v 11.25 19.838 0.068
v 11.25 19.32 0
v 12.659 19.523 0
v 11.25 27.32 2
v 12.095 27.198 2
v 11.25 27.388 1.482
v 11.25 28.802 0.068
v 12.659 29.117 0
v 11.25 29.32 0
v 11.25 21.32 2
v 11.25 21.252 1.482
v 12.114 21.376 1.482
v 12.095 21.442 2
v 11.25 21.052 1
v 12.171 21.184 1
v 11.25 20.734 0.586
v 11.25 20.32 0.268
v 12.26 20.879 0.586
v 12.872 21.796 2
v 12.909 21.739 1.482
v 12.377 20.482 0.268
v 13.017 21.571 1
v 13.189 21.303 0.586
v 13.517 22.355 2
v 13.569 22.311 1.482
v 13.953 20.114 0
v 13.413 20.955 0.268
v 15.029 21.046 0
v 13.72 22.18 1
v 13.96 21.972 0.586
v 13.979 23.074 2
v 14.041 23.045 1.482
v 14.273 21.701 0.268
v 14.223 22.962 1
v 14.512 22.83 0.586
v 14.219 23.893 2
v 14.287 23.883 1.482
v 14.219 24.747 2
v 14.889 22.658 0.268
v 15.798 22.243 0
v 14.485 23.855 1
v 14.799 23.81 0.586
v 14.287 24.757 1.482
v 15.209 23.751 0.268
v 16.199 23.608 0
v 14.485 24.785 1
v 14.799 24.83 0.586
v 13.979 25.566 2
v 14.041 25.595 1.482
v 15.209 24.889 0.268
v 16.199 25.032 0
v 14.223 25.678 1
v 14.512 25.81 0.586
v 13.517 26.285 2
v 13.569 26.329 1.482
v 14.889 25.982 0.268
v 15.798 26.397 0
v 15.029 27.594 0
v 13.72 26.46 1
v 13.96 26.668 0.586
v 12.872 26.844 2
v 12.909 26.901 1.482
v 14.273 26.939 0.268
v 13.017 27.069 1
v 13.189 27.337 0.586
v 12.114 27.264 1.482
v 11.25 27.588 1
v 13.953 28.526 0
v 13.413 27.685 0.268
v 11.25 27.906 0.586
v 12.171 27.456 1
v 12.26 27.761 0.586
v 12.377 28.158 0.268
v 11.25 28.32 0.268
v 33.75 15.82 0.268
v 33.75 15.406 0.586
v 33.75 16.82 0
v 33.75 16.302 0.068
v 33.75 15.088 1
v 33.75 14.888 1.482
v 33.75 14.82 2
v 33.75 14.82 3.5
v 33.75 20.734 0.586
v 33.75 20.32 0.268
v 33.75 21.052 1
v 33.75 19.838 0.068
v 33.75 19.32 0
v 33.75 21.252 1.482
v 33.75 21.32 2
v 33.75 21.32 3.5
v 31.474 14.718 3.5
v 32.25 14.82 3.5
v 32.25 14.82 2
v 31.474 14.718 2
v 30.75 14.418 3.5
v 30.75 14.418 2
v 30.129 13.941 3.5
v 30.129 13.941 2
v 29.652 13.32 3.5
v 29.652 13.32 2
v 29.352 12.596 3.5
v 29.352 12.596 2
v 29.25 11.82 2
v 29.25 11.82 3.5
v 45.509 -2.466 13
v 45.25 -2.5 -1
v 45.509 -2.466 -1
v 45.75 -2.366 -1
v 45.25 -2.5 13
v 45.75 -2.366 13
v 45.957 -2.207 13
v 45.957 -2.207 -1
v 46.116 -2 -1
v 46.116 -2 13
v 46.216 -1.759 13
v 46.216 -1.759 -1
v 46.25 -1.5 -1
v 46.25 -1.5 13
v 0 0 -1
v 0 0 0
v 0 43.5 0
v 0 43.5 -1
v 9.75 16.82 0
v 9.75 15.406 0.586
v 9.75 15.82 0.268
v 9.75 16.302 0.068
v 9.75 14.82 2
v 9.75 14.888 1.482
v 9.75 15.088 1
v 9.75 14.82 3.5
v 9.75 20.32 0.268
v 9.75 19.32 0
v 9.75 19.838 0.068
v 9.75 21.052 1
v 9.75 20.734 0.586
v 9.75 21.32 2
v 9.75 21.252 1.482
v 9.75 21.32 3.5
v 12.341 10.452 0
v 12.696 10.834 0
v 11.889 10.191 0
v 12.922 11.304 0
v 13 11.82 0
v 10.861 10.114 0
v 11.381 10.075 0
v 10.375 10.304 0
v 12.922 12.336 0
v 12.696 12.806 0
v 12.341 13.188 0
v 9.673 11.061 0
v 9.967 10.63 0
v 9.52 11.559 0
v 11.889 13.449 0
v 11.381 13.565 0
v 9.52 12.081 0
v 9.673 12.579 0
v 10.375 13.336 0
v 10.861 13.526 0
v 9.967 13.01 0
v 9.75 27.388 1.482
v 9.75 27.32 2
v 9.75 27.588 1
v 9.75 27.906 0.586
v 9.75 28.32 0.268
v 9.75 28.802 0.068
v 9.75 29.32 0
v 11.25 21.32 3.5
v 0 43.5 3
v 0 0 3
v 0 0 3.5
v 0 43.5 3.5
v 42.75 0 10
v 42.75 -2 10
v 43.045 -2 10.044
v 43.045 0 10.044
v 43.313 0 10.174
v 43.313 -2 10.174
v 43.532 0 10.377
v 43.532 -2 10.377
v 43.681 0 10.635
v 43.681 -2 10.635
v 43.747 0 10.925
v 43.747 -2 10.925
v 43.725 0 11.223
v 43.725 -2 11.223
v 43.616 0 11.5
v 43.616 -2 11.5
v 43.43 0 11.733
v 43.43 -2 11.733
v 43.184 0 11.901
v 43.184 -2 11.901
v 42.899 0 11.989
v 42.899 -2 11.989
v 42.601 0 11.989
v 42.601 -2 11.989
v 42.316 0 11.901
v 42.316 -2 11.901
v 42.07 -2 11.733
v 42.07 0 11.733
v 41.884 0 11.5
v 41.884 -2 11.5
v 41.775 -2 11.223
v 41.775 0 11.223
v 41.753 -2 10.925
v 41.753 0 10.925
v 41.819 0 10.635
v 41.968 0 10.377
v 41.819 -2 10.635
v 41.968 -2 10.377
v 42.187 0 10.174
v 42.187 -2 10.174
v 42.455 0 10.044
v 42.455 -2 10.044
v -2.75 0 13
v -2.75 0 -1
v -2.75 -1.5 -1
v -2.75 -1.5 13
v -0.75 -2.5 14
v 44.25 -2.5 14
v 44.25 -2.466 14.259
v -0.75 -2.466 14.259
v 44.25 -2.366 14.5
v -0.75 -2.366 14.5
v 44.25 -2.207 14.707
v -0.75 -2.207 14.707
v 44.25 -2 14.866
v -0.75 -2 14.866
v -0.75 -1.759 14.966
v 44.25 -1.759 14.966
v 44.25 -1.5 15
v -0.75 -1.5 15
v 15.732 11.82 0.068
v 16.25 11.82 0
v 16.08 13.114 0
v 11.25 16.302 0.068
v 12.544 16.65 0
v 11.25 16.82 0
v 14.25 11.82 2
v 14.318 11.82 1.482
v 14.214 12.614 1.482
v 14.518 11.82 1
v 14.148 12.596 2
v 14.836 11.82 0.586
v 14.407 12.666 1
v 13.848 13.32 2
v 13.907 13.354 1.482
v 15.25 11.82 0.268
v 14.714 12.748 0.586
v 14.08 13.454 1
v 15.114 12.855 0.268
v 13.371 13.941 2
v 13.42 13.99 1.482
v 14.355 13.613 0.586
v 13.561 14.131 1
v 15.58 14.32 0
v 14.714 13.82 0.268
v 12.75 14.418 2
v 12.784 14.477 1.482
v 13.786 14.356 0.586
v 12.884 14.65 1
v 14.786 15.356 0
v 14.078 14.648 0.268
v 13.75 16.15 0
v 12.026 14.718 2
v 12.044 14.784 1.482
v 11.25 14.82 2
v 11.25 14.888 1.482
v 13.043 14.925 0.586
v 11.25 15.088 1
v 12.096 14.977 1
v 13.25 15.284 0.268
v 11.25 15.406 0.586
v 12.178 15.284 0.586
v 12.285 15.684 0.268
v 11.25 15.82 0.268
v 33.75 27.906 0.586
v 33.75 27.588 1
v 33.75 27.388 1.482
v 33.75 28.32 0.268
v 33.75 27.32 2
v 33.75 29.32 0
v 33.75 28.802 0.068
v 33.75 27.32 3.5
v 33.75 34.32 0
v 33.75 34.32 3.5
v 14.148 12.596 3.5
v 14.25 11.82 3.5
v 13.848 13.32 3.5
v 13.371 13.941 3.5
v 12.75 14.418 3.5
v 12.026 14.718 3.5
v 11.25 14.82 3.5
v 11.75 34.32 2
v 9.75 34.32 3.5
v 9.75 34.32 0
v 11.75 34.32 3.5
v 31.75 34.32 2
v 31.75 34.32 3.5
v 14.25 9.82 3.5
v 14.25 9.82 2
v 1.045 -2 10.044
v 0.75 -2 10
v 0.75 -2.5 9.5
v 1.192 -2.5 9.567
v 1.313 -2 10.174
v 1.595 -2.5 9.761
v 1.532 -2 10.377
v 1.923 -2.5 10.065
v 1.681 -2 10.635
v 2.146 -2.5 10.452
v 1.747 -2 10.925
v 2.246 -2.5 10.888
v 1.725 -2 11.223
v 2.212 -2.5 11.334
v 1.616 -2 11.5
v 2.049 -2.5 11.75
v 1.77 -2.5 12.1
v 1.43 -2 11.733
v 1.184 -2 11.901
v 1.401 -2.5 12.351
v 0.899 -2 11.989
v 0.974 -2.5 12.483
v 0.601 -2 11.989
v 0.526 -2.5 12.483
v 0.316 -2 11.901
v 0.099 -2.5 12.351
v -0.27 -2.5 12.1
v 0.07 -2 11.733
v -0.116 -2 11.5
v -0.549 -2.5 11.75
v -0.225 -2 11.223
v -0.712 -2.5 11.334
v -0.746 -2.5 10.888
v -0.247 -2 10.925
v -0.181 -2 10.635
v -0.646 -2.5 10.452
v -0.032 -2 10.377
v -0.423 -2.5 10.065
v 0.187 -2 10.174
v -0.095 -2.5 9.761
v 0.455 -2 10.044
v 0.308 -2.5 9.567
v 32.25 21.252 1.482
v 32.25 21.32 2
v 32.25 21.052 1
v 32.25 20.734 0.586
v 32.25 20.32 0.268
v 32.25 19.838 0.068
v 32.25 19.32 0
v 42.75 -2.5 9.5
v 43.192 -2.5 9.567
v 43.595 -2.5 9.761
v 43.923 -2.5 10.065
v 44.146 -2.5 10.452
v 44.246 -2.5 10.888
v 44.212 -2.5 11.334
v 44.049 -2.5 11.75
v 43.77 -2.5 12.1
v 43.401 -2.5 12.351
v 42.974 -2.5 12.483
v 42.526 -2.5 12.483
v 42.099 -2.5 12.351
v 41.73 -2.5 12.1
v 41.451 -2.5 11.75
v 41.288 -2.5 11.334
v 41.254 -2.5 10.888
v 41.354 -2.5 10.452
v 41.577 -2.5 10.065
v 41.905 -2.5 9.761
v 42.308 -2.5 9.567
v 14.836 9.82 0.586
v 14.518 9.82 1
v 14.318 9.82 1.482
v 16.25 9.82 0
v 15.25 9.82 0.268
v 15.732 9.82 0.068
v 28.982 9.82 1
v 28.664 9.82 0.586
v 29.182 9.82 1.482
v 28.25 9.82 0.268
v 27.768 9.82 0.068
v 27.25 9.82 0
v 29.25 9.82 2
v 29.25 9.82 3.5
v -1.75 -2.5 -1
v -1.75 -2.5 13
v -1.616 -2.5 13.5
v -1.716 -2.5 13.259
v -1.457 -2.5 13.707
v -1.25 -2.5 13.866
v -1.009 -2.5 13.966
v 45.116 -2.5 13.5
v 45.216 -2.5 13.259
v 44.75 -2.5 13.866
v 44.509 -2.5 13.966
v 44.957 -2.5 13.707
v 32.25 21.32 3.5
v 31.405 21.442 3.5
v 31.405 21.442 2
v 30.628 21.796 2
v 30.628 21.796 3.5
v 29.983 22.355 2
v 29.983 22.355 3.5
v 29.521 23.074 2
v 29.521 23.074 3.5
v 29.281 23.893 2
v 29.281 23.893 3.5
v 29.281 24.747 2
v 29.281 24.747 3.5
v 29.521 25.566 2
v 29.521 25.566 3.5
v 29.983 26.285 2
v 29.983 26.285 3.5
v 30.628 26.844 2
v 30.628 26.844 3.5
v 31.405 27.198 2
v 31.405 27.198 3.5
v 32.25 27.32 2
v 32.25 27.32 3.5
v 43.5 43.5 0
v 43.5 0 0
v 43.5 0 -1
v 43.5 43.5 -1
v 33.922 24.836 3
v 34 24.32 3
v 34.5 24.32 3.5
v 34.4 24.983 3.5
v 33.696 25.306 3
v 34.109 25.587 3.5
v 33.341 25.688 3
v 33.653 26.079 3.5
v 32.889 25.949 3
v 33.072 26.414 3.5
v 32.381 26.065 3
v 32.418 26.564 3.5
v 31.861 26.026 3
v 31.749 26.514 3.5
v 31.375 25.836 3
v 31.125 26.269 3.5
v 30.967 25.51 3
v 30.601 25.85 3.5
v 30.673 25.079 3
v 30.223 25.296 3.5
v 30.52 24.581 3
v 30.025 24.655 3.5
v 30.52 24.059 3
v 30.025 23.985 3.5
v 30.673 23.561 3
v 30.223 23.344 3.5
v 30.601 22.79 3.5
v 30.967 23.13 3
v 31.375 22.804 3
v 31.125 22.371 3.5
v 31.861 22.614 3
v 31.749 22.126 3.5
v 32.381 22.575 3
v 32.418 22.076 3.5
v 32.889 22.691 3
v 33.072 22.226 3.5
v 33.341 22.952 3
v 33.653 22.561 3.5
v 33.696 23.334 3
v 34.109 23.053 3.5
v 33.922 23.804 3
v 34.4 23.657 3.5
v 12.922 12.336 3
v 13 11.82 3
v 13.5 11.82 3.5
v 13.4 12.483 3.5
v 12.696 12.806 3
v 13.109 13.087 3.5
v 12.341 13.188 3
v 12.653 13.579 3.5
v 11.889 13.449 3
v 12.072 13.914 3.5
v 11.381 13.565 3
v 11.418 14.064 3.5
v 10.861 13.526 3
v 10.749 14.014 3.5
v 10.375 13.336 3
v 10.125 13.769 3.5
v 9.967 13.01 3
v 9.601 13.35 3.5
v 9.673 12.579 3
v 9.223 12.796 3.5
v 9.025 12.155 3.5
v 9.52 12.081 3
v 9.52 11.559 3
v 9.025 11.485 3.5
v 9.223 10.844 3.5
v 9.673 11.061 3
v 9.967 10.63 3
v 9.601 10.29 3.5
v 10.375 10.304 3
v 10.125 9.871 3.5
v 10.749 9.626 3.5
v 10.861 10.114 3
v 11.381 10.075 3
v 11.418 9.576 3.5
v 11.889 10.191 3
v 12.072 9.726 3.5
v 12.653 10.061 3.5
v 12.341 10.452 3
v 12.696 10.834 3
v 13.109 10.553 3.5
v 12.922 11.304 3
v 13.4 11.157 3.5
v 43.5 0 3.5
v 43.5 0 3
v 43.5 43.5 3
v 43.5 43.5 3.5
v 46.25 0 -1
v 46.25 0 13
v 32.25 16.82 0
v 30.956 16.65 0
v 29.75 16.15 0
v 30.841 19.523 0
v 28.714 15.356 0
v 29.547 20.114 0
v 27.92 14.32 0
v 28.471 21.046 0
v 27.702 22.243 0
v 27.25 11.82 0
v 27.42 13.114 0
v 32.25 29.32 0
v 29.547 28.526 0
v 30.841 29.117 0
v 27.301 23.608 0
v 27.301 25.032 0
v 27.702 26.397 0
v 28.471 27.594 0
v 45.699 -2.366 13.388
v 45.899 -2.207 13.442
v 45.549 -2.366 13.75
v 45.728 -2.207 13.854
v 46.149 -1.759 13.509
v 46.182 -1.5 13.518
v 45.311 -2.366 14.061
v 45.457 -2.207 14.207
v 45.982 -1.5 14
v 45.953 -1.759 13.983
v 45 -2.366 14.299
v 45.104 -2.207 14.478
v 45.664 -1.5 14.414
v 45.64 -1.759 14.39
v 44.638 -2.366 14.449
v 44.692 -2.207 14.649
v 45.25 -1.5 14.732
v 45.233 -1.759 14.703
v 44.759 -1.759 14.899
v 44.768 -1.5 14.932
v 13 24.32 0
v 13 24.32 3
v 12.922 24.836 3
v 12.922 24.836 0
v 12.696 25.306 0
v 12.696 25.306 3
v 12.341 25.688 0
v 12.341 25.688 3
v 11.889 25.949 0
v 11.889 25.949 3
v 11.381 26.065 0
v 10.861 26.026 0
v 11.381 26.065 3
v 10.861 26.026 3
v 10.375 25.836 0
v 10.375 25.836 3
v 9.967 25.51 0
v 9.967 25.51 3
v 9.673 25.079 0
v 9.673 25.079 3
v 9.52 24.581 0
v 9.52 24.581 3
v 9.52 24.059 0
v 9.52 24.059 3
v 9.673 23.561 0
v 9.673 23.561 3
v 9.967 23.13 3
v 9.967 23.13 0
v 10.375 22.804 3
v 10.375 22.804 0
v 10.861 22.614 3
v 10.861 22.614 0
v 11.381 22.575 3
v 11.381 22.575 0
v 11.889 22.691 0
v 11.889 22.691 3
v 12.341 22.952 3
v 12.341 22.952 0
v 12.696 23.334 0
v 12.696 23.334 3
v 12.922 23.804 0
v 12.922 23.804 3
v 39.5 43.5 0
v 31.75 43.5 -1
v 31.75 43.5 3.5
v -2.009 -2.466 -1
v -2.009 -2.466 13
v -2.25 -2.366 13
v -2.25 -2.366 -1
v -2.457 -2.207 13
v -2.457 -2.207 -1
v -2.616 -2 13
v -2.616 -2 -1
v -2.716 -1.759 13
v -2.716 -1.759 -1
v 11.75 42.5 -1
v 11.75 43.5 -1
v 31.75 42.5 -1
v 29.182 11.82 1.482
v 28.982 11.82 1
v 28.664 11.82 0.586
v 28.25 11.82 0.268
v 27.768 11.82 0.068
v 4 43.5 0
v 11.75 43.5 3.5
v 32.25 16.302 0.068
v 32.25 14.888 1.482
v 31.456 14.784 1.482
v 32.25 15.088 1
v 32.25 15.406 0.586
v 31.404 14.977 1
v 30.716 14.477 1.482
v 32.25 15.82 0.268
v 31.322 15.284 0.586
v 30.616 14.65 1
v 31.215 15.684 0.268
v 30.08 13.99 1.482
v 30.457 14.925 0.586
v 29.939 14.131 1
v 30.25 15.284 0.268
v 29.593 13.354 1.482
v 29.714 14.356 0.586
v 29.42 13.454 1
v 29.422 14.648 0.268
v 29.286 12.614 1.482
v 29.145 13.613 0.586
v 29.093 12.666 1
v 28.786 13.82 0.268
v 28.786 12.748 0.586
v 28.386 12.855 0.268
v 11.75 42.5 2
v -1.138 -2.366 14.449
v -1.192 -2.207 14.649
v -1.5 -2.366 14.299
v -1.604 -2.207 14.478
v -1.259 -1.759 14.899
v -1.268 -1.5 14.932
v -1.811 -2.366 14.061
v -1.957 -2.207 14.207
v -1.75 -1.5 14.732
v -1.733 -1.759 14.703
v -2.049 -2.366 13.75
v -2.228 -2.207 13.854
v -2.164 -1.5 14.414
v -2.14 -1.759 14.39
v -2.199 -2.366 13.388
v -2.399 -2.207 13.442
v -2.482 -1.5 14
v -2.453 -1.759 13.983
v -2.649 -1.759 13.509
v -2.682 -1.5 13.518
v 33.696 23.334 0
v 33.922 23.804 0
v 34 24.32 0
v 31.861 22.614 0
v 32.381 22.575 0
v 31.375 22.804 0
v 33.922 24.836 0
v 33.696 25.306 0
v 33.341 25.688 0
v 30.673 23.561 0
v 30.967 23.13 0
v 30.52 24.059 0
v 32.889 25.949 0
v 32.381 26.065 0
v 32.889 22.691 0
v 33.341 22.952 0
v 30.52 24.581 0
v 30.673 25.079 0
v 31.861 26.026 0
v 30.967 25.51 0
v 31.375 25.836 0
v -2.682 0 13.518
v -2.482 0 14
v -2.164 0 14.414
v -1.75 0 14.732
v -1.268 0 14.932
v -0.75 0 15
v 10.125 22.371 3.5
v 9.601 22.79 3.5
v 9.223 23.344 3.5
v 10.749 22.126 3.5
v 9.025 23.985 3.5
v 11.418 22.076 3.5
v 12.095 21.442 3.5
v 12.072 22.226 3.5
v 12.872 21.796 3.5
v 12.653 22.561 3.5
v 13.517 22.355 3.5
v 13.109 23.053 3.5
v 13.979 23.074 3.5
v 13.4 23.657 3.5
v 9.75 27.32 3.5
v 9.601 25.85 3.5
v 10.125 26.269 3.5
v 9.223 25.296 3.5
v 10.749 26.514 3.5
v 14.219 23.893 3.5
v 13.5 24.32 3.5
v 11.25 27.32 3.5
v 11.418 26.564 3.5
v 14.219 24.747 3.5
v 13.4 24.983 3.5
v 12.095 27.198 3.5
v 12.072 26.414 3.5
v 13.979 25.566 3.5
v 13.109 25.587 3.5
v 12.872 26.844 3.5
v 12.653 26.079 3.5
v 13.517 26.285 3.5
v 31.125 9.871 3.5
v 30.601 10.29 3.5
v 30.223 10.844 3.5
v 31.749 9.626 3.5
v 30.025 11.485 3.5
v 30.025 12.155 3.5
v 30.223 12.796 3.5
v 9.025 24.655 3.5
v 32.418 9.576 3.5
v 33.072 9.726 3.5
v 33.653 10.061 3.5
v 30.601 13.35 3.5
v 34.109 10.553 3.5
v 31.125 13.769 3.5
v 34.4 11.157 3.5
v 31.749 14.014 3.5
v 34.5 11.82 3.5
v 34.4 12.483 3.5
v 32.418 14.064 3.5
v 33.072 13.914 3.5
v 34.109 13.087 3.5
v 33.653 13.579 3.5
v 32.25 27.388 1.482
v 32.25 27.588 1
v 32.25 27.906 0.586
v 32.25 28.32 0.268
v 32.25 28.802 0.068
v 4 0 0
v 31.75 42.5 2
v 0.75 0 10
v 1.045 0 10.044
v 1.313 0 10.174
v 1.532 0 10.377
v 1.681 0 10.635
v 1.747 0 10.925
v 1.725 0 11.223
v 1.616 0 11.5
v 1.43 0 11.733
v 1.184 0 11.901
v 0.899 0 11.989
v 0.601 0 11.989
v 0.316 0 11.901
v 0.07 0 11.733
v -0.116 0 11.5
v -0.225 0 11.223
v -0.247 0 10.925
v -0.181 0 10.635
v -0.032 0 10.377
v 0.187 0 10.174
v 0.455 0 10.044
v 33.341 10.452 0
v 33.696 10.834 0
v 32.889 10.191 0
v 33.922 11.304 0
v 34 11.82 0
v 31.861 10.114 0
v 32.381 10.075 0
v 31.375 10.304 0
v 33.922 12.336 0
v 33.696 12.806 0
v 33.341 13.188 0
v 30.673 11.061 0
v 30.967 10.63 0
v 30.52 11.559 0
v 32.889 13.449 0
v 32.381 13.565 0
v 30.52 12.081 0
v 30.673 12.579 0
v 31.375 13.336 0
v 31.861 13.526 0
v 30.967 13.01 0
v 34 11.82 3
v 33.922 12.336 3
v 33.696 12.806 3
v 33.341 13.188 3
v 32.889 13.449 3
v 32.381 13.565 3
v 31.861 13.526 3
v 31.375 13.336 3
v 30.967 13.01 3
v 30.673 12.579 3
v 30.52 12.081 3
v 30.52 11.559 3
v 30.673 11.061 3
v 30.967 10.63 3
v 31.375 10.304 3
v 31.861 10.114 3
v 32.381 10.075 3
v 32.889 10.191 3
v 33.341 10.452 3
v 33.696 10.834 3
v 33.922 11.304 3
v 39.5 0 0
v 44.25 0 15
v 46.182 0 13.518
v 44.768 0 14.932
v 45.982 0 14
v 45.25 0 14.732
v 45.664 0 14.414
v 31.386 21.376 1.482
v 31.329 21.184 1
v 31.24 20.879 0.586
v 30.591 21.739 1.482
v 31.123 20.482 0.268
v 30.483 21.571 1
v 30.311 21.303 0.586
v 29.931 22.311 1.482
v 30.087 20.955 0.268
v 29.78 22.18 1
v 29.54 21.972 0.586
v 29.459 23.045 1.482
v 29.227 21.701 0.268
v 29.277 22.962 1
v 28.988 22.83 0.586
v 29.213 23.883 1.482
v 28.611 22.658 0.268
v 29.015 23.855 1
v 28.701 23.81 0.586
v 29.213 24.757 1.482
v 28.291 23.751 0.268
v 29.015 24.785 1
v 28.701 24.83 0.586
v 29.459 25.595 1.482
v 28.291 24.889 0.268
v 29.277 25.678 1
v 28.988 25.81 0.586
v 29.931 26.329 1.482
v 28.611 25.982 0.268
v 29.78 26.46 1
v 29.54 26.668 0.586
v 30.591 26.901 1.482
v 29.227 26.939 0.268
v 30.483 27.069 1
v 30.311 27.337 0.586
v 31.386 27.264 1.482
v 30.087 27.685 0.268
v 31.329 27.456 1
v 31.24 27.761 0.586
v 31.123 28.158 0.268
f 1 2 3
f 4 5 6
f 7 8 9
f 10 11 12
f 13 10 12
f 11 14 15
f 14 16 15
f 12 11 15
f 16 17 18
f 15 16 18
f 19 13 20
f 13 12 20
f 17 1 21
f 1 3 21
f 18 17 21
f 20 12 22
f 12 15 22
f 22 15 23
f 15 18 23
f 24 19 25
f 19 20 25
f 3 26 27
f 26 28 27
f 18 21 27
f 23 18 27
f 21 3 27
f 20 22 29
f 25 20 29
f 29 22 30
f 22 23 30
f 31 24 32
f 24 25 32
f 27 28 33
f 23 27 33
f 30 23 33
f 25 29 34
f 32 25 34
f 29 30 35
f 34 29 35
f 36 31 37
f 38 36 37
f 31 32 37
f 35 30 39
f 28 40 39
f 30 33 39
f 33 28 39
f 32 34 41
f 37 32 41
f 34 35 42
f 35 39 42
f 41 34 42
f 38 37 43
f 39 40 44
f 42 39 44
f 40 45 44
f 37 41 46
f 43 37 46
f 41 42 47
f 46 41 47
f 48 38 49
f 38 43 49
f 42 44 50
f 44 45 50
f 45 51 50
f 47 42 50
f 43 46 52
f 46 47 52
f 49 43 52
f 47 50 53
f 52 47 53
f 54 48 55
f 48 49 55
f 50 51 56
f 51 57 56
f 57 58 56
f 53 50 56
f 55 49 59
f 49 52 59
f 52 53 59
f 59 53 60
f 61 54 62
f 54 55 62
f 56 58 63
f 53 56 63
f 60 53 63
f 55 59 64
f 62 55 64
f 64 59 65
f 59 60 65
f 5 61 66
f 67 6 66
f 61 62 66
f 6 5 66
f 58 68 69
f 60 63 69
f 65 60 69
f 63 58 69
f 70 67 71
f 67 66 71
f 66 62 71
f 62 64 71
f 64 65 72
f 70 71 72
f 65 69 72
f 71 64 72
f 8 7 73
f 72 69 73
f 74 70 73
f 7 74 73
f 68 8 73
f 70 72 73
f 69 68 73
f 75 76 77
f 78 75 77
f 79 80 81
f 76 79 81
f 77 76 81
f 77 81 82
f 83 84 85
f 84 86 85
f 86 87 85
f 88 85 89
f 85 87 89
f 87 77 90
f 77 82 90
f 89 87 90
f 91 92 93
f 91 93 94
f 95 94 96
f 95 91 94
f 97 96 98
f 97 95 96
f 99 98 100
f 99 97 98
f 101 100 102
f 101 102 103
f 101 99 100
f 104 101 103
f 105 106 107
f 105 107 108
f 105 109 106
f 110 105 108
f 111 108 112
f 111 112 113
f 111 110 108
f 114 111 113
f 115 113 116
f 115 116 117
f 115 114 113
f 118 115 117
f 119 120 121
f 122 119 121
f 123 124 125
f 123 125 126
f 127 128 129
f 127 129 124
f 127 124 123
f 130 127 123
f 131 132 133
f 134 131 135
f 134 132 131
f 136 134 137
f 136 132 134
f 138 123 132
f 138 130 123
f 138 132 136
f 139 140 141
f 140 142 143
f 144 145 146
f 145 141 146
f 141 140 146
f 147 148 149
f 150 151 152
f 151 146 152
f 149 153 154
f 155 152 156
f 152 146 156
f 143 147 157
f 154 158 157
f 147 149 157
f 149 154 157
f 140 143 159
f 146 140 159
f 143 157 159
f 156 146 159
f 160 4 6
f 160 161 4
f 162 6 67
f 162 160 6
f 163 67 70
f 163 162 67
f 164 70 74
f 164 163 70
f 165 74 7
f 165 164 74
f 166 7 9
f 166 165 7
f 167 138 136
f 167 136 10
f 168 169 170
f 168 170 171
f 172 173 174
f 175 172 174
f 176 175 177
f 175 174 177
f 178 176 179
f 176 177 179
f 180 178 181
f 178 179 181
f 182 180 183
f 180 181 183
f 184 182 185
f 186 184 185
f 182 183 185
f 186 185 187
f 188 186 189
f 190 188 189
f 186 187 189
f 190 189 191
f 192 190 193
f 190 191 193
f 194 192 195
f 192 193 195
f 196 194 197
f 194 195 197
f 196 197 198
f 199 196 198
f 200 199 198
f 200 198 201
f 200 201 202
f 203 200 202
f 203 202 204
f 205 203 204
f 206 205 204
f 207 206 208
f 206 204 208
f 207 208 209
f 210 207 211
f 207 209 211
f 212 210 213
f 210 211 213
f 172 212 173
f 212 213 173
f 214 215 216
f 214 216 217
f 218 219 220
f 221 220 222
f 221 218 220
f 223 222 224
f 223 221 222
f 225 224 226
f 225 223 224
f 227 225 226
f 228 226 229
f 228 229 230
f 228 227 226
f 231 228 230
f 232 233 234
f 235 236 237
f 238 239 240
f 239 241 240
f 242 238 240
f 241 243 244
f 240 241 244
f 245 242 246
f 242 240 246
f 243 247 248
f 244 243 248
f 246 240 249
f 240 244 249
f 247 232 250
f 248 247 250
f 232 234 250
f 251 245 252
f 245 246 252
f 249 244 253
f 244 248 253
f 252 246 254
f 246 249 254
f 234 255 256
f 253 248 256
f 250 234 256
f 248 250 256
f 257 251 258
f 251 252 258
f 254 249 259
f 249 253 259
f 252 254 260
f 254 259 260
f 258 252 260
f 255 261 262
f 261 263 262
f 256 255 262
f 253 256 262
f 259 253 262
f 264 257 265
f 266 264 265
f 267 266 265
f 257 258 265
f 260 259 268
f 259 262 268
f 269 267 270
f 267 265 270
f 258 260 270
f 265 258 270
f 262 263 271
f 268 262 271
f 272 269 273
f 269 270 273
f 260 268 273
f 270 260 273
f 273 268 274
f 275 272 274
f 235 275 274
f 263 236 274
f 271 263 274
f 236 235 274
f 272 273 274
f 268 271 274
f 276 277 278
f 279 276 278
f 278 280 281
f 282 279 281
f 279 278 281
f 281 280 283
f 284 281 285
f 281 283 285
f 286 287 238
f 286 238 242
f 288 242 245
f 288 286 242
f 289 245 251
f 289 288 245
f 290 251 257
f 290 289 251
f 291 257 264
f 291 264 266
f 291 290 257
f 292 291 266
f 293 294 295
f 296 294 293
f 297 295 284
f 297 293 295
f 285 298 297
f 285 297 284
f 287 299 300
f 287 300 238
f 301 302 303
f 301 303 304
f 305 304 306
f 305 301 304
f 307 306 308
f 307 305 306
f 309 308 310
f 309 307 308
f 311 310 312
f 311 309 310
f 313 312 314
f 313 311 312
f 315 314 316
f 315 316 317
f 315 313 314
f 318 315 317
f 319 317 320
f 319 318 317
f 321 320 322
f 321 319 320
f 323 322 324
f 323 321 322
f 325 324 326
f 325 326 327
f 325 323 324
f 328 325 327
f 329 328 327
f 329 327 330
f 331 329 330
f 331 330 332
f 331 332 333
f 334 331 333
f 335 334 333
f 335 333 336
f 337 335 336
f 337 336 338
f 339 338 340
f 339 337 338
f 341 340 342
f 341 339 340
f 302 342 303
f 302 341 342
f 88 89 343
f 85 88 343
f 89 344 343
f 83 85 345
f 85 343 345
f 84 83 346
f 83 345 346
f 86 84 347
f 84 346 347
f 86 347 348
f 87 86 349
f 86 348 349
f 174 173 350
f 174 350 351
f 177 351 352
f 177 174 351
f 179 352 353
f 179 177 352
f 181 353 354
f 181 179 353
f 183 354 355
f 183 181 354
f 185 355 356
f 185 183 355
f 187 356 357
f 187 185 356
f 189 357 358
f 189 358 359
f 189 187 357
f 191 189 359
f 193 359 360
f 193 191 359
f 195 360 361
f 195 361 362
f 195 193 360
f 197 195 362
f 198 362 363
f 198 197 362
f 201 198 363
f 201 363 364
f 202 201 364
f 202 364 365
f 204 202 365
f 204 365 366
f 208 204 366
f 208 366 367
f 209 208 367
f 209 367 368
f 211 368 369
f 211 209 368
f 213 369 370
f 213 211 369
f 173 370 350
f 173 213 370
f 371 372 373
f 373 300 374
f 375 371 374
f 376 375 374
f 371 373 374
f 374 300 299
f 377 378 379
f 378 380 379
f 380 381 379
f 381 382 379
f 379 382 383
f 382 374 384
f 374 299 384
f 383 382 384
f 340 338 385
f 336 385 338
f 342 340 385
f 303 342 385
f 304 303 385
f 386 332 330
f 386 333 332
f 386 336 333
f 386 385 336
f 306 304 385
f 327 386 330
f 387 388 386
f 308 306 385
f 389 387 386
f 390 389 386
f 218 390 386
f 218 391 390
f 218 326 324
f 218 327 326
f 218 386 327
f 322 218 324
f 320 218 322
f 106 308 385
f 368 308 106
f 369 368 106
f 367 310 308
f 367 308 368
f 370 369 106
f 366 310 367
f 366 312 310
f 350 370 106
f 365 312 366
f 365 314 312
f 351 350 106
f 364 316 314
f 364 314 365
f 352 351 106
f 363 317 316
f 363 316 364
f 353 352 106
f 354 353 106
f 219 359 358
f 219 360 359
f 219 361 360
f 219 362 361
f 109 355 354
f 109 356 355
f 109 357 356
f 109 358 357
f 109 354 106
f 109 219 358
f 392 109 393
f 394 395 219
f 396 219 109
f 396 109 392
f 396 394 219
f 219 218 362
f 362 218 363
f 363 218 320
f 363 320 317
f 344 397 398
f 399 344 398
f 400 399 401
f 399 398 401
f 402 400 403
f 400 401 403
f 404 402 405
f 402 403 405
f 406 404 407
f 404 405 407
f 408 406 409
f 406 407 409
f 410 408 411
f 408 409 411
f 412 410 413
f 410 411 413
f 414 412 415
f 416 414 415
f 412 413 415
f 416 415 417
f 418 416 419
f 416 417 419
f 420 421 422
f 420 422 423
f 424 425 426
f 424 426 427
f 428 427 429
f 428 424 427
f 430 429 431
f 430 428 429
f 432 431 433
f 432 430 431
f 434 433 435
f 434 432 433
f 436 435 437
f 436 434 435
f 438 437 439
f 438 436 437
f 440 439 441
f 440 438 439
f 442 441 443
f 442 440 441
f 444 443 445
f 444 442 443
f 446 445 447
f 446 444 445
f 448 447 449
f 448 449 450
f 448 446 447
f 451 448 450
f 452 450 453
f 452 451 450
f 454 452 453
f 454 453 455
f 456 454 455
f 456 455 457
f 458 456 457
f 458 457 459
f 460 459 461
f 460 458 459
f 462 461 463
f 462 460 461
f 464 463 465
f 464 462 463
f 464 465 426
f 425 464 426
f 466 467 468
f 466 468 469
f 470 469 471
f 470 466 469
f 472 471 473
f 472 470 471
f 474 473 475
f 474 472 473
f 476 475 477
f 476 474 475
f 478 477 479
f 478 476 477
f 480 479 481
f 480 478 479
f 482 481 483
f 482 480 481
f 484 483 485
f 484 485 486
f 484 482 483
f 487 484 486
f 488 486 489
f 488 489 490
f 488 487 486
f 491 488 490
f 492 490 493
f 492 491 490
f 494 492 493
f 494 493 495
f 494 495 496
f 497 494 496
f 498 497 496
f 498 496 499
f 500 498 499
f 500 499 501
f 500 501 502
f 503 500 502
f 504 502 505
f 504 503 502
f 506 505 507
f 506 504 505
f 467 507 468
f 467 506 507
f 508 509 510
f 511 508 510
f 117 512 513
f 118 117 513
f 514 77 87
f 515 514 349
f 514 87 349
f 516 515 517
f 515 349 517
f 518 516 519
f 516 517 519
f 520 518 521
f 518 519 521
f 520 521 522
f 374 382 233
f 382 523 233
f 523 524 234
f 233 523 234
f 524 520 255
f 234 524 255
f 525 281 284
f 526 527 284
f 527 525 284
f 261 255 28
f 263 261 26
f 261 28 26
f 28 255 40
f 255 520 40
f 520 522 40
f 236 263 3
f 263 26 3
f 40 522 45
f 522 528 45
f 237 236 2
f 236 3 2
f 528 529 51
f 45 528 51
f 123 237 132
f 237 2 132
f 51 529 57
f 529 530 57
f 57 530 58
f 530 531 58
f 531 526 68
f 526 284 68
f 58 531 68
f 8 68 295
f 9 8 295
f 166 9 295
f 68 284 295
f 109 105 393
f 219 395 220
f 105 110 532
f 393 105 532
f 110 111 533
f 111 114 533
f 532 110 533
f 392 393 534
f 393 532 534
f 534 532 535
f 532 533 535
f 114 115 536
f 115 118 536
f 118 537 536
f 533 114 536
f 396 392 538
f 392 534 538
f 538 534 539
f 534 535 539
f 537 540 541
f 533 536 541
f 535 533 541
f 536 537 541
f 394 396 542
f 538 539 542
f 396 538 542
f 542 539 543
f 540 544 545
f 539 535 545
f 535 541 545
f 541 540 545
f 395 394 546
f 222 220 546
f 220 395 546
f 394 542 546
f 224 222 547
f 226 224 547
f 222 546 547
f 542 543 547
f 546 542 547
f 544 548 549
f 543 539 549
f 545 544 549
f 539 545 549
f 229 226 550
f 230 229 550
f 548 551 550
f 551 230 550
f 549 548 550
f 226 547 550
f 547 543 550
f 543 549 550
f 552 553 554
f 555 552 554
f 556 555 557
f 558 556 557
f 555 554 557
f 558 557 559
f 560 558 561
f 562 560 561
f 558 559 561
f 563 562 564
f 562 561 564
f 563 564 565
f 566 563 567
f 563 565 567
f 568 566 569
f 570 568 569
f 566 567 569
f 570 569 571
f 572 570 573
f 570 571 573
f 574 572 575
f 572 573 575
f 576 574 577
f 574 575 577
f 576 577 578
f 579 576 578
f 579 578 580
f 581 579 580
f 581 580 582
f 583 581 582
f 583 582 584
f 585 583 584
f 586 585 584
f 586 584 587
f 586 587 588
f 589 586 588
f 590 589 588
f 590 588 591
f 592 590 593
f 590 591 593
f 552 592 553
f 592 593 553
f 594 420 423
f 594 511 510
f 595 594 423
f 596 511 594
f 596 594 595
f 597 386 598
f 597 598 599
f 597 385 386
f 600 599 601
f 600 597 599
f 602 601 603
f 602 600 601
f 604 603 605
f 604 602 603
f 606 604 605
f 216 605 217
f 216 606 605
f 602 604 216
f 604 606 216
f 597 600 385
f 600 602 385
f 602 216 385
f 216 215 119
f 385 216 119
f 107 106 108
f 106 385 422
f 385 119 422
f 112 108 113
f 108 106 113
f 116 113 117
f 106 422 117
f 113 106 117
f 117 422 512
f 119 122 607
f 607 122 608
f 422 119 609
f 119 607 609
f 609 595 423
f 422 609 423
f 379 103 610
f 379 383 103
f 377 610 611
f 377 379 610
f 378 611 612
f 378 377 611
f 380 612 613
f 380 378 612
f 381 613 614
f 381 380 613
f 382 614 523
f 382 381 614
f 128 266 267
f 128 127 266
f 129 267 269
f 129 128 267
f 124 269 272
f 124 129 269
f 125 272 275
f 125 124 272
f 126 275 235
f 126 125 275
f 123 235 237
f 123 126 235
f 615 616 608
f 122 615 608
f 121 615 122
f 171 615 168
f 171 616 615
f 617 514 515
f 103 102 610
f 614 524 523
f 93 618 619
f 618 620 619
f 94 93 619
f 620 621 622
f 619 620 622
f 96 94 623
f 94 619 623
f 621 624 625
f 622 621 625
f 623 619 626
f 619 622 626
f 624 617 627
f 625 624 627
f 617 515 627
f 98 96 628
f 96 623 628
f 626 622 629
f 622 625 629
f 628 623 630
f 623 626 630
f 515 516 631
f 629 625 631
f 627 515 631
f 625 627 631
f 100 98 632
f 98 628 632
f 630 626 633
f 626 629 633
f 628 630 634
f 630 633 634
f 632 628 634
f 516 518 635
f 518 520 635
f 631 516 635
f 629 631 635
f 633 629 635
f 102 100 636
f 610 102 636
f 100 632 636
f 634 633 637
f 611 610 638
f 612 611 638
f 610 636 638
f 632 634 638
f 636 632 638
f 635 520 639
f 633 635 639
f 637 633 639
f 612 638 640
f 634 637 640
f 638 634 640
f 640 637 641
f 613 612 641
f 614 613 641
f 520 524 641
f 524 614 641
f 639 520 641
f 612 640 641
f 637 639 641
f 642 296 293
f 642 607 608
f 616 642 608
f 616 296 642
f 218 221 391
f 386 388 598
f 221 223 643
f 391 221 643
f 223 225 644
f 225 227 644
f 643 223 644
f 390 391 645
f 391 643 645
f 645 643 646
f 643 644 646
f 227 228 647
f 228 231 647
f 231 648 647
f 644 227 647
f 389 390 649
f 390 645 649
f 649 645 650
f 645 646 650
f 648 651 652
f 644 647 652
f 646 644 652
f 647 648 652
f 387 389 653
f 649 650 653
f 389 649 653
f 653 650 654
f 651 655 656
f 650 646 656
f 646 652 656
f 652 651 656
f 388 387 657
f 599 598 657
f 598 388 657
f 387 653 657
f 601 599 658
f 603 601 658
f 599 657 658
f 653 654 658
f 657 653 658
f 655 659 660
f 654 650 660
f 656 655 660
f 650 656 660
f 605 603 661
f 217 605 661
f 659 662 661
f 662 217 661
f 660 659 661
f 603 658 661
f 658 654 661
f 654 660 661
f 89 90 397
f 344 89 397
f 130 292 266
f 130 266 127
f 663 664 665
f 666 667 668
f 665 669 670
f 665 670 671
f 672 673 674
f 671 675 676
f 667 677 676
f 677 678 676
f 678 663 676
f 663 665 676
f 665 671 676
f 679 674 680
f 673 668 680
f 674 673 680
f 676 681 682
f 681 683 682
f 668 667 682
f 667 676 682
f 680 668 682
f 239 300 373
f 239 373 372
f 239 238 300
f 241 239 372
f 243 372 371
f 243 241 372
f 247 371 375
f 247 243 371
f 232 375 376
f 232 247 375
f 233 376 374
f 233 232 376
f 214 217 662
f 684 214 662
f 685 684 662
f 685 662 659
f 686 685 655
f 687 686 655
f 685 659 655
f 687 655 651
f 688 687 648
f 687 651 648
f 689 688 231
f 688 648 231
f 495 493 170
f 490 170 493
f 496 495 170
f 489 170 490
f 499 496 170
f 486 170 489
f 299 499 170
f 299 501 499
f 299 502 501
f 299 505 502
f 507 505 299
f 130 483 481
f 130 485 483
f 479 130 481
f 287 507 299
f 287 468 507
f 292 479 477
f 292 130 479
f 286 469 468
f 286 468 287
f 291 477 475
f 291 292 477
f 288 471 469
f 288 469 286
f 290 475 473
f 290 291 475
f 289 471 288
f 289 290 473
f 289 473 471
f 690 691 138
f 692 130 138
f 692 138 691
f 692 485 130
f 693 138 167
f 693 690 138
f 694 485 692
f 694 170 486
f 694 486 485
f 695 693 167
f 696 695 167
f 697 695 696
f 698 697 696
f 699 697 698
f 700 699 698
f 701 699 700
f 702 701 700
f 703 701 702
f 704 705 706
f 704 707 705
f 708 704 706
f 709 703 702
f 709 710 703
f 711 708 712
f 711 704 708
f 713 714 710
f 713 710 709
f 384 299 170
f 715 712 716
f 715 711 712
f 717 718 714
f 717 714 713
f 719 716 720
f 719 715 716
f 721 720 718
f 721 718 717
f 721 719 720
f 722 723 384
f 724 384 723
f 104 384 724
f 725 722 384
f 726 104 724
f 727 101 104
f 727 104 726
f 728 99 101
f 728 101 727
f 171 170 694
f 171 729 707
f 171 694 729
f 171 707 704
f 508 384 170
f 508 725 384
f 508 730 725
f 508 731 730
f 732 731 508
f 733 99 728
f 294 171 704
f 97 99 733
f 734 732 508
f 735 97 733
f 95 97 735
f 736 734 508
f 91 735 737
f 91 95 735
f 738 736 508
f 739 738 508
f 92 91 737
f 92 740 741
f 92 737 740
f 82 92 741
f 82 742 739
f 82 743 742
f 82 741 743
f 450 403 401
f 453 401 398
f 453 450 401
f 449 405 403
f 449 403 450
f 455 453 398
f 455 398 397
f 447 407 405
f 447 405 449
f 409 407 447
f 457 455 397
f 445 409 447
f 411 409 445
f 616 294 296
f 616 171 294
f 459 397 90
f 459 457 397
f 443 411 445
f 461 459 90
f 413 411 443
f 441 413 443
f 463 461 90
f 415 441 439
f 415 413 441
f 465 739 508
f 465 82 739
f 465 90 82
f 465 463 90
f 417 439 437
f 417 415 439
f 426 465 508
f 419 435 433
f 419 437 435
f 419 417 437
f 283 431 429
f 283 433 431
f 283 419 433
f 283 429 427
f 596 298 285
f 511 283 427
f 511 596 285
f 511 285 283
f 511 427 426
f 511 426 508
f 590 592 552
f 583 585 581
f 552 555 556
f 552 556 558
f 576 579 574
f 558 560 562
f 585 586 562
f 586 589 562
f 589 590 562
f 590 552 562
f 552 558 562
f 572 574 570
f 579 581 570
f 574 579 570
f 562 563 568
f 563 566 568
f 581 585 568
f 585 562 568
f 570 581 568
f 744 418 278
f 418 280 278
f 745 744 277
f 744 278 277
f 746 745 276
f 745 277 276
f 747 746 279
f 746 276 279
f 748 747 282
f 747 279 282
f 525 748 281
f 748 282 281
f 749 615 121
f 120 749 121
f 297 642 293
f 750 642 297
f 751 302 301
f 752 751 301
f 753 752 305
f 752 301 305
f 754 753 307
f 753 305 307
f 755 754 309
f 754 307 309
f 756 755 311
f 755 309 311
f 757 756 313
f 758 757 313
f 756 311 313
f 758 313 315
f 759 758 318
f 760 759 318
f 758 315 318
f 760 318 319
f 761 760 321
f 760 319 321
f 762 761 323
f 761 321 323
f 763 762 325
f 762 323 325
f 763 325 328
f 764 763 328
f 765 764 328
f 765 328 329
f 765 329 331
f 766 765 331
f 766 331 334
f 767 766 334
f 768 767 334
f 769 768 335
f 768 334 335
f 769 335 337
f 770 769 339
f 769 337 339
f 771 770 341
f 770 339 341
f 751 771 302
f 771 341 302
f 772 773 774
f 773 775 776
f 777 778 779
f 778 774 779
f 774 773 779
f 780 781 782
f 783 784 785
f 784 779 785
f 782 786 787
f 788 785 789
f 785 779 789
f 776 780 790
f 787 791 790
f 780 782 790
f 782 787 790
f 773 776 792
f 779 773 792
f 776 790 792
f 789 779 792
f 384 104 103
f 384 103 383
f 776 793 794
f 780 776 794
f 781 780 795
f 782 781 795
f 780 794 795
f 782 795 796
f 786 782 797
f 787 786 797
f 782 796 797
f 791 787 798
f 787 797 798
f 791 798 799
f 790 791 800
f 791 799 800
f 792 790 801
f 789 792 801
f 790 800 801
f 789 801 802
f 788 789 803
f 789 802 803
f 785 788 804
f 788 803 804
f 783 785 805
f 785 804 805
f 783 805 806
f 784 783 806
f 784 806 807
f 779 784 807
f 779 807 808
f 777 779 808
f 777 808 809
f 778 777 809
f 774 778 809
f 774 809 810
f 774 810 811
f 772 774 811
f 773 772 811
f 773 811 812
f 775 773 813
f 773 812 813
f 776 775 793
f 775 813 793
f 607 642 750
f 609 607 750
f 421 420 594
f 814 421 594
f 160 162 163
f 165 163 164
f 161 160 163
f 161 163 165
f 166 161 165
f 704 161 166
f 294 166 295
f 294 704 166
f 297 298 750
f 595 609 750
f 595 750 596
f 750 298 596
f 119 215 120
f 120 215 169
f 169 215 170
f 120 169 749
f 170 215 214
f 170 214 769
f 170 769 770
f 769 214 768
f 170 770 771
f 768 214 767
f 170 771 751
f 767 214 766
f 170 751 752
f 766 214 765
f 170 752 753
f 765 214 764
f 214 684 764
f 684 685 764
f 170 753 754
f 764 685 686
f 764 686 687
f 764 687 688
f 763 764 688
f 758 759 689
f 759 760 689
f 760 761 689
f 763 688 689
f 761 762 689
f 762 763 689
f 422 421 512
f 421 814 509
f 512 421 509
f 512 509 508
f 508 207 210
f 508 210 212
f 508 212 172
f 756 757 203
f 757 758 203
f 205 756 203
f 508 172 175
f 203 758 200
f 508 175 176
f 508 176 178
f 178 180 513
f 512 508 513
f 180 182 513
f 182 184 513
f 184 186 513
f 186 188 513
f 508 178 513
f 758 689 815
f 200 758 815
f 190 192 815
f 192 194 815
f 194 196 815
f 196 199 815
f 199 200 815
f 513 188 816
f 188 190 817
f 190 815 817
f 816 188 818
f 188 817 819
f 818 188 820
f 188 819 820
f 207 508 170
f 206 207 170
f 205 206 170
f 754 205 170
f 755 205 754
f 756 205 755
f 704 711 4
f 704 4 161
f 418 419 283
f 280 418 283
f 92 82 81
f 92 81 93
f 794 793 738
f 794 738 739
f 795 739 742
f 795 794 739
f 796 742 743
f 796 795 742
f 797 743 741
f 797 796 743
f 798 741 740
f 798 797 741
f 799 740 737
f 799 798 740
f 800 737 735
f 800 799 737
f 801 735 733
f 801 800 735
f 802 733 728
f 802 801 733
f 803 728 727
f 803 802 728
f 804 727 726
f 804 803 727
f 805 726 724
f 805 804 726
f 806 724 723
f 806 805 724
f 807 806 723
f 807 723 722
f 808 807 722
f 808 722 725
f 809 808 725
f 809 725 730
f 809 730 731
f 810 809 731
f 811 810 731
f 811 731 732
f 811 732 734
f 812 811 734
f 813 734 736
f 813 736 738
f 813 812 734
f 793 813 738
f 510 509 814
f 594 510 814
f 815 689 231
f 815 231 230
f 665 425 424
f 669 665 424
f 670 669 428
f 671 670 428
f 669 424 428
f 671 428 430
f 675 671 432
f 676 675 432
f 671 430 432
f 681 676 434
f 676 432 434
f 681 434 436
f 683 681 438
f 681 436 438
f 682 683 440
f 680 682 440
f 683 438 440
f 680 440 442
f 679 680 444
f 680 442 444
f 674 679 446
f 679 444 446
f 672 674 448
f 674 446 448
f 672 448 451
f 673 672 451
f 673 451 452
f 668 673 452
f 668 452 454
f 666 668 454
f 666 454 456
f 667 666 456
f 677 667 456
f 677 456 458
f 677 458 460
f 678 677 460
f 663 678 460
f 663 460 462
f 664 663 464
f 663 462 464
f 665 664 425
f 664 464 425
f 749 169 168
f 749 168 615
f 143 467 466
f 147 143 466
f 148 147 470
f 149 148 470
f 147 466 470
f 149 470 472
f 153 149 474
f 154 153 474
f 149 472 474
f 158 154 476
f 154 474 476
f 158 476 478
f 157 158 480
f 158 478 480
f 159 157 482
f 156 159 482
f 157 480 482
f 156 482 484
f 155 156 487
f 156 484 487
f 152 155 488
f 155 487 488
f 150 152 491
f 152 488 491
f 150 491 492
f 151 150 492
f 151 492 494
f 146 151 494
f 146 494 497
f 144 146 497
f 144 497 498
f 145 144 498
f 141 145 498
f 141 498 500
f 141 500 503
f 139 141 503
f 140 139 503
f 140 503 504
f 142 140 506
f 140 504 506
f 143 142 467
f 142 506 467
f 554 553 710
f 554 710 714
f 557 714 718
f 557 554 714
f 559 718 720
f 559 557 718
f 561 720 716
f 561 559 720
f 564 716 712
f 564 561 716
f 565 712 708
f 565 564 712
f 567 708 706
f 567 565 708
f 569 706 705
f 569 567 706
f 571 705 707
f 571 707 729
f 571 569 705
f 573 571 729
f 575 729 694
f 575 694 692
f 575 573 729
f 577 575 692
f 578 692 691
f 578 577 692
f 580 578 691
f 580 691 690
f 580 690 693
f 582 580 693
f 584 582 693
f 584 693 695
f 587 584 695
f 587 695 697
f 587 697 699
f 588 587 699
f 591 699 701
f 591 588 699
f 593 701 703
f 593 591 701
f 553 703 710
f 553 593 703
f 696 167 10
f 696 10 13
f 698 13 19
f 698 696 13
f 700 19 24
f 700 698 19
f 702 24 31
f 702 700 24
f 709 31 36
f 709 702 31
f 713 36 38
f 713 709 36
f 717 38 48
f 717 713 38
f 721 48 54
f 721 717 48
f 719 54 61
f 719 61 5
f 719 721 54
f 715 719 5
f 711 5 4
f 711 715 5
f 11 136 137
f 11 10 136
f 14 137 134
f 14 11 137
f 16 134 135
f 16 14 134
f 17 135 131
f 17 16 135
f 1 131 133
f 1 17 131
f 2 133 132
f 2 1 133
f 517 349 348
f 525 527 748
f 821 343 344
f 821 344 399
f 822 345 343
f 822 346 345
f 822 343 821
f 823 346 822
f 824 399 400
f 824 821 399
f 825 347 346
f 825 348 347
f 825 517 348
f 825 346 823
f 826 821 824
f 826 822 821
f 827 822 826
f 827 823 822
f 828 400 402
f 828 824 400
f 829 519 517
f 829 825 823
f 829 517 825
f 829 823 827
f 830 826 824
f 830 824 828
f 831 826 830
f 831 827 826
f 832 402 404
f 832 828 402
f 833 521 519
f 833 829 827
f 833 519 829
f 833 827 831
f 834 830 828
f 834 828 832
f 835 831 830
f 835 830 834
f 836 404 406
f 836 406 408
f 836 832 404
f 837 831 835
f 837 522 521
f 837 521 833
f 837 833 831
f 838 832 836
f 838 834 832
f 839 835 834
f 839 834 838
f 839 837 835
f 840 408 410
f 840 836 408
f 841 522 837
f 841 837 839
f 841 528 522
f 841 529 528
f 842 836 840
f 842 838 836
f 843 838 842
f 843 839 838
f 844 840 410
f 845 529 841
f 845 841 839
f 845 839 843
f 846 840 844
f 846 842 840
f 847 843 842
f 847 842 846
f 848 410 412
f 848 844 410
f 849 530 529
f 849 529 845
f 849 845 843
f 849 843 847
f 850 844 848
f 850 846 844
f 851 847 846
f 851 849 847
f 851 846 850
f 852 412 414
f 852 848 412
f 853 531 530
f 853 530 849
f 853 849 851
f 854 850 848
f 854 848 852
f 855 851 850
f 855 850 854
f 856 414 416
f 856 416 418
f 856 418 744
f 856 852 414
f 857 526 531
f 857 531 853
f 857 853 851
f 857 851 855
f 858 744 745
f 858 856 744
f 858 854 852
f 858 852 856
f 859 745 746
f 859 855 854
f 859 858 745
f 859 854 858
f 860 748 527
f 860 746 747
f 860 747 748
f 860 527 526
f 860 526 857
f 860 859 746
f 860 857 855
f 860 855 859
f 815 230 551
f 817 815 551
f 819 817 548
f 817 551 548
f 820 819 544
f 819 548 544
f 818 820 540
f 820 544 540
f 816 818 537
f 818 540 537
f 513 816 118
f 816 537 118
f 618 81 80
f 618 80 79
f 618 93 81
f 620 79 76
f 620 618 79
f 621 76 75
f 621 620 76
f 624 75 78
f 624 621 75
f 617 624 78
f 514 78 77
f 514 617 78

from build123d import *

# Parameters (mm, degrees)
ESQUISSE1_W             = 43.5
ESQUISSE1_H             = 43.5
BOSS_EXTRU_1_DEPTH      = 3.5
ESQUISSE3_W             = 24
ESQUISSE3_H             = 24.5
ENL_V_MAT_EXTRU_1_DEPTH = 3.5
ENL_V_MAT_EXTRU_3_DEPTH = 43.5
ESQUISSE5_W             = 20
ESQUISSE5_H             = 9.18
ENL_V_MAT_EXTRU_4_DEPTH = 1.5
BOSS_EXTRU_2_DEPTH      = 3.5
ESQUISSE8_R             = 1.75
ENL_V_MAT_EXTRU_5_DEPTH = 3.5
ESQUISSE9_W             = 43.5
ESQUISSE9_H             = 43.5
BOSS_EXTRU_3_DEPTH      = 1
CONG_2_R                = 2
CHANFREIN1_SIZE         = 0.5
ESQUISSE10_W            = 20
ESQUISSE10_H            = 1
ENL_V_MAT_EXTRU_6_DEPTH = 3
ESQUISSE11_W            = 49
ESQUISSE11_H            = 16
BOSS_EXTRU_4_DEPTH      = 2.5
ESQUISSE12_R            = 1
ENL_V_MAT_EXTRU_7_DEPTH = 2.5
CONG_3_R                = 2
CONG_4_R                = 1
CHANFREIN2_SIZE         = 0.5


with BuildPart() as part:
    # Esquisse1 → Boss.-Extru.1 (new body)
    with BuildSketch(Plane.XY):
        with Locations((21.75, 21.75)):
            Rectangle(ESQUISSE1_W, ESQUISSE1_H)
    extrude(amount=BOSS_EXTRU_1_DEPTH)

    # Esquisse3 → Enlèv. mat.-Extru.1 (cut)
    with BuildSketch(Plane.XY.offset(3.5)):
        with Locations((21.75, 22.07)):
            Rectangle(ESQUISSE3_W, ESQUISSE3_H)
    extrude(amount=-ENL_V_MAT_EXTRU_1_DEPTH, mode=Mode.SUBTRACT)

    # Esquisse4 → Enlèv. mat.-Extru.3 (cut)
    with BuildSketch(Plane.XZ):
        Polygon((0, 0), (0, 3), (4, 0), align=None)
        Polygon((43.5, 3), (39.5, 0), (43.5, 0), align=None)
    extrude(amount=-ENL_V_MAT_EXTRU_3_DEPTH, mode=Mode.SUBTRACT)

    # Esquisse5 → Enlèv. mat.-Extru.4 (cut)
    with BuildSketch(Plane.XY.offset(3.5)):
        with Locations((21.75, 38.91)):
            Rectangle(ESQUISSE5_W, ESQUISSE5_H)
    extrude(amount=-ENL_V_MAT_EXTRU_4_DEPTH, mode=Mode.SUBTRACT)

    # Esquisse6 → Boss.-Extru.2 (add)
    with BuildSketch(Plane.XY.offset(3.5)):
        with BuildLine():
            Line((11.25, 27.32), (9.75, 27.32))
            Line((9.75, 27.32), (9.75, 21.32))
            Line((9.75, 21.32), (11.25, 21.32))
            ThreePointArc((11.25, 21.32), (14.25, 24.32), (11.25, 27.32))
        make_face()
        with BuildLine():
            Line((11.25, 14.82), (9.75, 14.82))
            Line((9.75, 14.82), (9.75, 9.82))
            Line((9.75, 9.82), (14.25, 9.82))
            Line((14.25, 9.82), (14.25, 11.82))
            ThreePointArc((14.25, 11.82), (13.371320344, 13.941320344), (11.25, 14.82))
        make_face()
        with BuildLine():
            Line((29.25, 11.82), (29.25, 9.82))
            Line((29.25, 9.82), (33.75, 9.82))
            Line((33.75, 9.82), (33.75, 14.82))
            Line((33.75, 14.82), (32.25, 14.82))
            ThreePointArc((32.25, 14.82), (30.128679656, 13.941320344), (29.25, 11.82))
        make_face()
        with BuildLine():
            Line((32.25, 27.32), (33.75, 27.32))
            Line((33.75, 27.32), (33.75, 21.32))
            Line((33.75, 21.32), (32.25, 21.32))
            ThreePointArc((32.25, 21.32), (29.25, 24.32), (32.25, 27.32))
        make_face()
    extrude(amount=-BOSS_EXTRU_2_DEPTH)

    # Esquisse8 → Enlèv. mat.-Extru.5 (cut)
    with BuildSketch(Plane.XY.offset(3.5)):
        with Locations((11.25, 24.32)):
            Circle(ESQUISSE8_R)
        with Locations((32.25, 24.32)):
            Circle(ESQUISSE8_R)
        with Locations((32.25, 11.82)):
            Circle(ESQUISSE8_R)
        with Locations((11.25, 11.82)):
            Circle(ESQUISSE8_R)
    extrude(amount=-ENL_V_MAT_EXTRU_5_DEPTH, mode=Mode.SUBTRACT)

    # Esquisse9 → Boss.-Extru.3 (add)
    with BuildSketch(Plane(origin=(0, 0, 0), x_dir=(-1, 0, 0), z_dir=(0, 0, -1))):
        with Locations((-21.75, 21.75)):
            Rectangle(ESQUISSE9_W, ESQUISSE9_H)
    extrude(amount=BOSS_EXTRU_3_DEPTH)

    # Congé2
    cong_2_edges = [part.edges().sort_by_distance(p)[0] for p in [
        (29.25, 24.32, 0),
        (33, 27.32, 0),
        (33, 21.32, 0),
        (14.25, 24.32, 0),
        (10.5, 21.32, 0),
        (10.5, 27.32, 0),
        (13.371320344, 13.941320344, 0),
        (14.25, 10.82, 0),
        (10.5, 14.82, 0),
        (30.128679656, 13.941320344, 0),
        (33, 14.82, 0),
        (29.25, 10.82, 0),
    ]]
    fillet(cong_2_edges, radius=CONG_2_R)

    # Chanfrein1
    chanfrein1_edges = [part.edges().sort_by_distance(p)[0] for p in [
        (9.5, 11.82, 3.5),
        (30.5, 11.82, 3.5),
        (30.5, 24.32, 3.5),
        (9.5, 24.32, 3.5),
    ]]
    chamfer(chanfrein1_edges, length=CHANFREIN1_SIZE)

    # Esquisse10 → Enlèv. mat.-Extru.6 (cut)
    with BuildSketch(Plane.XY.offset(2)):
        with Locations((21.75, 43)):
            Rectangle(ESQUISSE10_W, ESQUISSE10_H)
    extrude(amount=-ENL_V_MAT_EXTRU_6_DEPTH, mode=Mode.SUBTRACT)

    # Esquisse11 → Boss.-Extru.4 (add)
    with BuildSketch(Plane.XZ):
        with Locations((21.75, 7)):
            Rectangle(ESQUISSE11_W, ESQUISSE11_H)
    extrude(amount=BOSS_EXTRU_4_DEPTH)

    # Esquisse12 → Enlèv. mat.-Extru.7 (cut)
    with BuildSketch(Plane.XZ.offset(2.5)):
        with Locations(Location((0.75, 11, 0), (0, 0, 270))):
            Circle(ESQUISSE12_R)
        with Locations(Location((42.75, 11, 0), (0, 0, 270))):
            Circle(ESQUISSE12_R)
    extrude(amount=-ENL_V_MAT_EXTRU_7_DEPTH, mode=Mode.SUBTRACT)

    # Congé3
    cong_3_edges = [part.edges().sort_by_distance(p)[0] for p in [
        (-2.75, -1.25, 15),
        (46.25, -1.25, 15),
    ]]
    fillet(cong_3_edges, radius=CONG_3_R)

    # Congé4
    cong_4_edges = [part.edges().sort_by_distance(p)[0] for p in [
        (46.25, -2.5, 6),
        (-2.75, -2.5, 6),
        (21.75, -2.5, 15),
        (45.664213562, -2.5, 14.414213562),
        (-2.164213562, -2.5, 14.414213562),
    ]]
    fillet(cong_4_edges, radius=CONG_4_R)

    # Chanfrein2
    chanfrein2_edges = [part.edges().sort_by_distance(p)[0] for p in [
        (0.75, -2.5, 12),
        (42.75, -2.5, 12),
    ]]
    chamfer(chanfrein2_edges, length=CHANFREIN2_SIZE)


solid = part.part
